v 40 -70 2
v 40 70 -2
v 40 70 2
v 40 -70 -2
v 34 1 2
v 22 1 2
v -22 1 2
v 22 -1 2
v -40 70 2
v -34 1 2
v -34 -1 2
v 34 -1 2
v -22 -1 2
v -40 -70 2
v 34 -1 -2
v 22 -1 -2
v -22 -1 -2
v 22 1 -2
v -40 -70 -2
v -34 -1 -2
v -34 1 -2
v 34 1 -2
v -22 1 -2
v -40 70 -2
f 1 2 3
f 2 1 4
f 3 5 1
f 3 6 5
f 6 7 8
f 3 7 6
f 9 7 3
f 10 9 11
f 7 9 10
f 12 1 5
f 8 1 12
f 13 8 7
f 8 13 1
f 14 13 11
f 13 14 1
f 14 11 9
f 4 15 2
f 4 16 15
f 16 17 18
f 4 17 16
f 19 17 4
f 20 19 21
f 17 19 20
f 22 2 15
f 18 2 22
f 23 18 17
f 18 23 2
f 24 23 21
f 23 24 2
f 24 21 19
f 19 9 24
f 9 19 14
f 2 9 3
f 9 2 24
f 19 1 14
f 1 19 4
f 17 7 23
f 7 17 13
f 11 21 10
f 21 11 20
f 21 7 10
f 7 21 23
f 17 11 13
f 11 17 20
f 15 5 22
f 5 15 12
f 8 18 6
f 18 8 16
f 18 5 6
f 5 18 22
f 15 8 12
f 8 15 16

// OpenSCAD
// ========================================
// a 80 x 140 x 4 mm plate with two 12 x 2 mm slots
// NeuroCAD canonical IR; dimensions are millimetres
// ========================================
$fn = 48;

difference() {
  cube(size=[80, 140, 4], center=true);
  translate([-28, 0, 0]) {
    cube(size=[12, 2, 6], center=true);
  }
  translate([28, 0, 0]) {
    cube(size=[12, 2, 6], center=true);
  }
}
